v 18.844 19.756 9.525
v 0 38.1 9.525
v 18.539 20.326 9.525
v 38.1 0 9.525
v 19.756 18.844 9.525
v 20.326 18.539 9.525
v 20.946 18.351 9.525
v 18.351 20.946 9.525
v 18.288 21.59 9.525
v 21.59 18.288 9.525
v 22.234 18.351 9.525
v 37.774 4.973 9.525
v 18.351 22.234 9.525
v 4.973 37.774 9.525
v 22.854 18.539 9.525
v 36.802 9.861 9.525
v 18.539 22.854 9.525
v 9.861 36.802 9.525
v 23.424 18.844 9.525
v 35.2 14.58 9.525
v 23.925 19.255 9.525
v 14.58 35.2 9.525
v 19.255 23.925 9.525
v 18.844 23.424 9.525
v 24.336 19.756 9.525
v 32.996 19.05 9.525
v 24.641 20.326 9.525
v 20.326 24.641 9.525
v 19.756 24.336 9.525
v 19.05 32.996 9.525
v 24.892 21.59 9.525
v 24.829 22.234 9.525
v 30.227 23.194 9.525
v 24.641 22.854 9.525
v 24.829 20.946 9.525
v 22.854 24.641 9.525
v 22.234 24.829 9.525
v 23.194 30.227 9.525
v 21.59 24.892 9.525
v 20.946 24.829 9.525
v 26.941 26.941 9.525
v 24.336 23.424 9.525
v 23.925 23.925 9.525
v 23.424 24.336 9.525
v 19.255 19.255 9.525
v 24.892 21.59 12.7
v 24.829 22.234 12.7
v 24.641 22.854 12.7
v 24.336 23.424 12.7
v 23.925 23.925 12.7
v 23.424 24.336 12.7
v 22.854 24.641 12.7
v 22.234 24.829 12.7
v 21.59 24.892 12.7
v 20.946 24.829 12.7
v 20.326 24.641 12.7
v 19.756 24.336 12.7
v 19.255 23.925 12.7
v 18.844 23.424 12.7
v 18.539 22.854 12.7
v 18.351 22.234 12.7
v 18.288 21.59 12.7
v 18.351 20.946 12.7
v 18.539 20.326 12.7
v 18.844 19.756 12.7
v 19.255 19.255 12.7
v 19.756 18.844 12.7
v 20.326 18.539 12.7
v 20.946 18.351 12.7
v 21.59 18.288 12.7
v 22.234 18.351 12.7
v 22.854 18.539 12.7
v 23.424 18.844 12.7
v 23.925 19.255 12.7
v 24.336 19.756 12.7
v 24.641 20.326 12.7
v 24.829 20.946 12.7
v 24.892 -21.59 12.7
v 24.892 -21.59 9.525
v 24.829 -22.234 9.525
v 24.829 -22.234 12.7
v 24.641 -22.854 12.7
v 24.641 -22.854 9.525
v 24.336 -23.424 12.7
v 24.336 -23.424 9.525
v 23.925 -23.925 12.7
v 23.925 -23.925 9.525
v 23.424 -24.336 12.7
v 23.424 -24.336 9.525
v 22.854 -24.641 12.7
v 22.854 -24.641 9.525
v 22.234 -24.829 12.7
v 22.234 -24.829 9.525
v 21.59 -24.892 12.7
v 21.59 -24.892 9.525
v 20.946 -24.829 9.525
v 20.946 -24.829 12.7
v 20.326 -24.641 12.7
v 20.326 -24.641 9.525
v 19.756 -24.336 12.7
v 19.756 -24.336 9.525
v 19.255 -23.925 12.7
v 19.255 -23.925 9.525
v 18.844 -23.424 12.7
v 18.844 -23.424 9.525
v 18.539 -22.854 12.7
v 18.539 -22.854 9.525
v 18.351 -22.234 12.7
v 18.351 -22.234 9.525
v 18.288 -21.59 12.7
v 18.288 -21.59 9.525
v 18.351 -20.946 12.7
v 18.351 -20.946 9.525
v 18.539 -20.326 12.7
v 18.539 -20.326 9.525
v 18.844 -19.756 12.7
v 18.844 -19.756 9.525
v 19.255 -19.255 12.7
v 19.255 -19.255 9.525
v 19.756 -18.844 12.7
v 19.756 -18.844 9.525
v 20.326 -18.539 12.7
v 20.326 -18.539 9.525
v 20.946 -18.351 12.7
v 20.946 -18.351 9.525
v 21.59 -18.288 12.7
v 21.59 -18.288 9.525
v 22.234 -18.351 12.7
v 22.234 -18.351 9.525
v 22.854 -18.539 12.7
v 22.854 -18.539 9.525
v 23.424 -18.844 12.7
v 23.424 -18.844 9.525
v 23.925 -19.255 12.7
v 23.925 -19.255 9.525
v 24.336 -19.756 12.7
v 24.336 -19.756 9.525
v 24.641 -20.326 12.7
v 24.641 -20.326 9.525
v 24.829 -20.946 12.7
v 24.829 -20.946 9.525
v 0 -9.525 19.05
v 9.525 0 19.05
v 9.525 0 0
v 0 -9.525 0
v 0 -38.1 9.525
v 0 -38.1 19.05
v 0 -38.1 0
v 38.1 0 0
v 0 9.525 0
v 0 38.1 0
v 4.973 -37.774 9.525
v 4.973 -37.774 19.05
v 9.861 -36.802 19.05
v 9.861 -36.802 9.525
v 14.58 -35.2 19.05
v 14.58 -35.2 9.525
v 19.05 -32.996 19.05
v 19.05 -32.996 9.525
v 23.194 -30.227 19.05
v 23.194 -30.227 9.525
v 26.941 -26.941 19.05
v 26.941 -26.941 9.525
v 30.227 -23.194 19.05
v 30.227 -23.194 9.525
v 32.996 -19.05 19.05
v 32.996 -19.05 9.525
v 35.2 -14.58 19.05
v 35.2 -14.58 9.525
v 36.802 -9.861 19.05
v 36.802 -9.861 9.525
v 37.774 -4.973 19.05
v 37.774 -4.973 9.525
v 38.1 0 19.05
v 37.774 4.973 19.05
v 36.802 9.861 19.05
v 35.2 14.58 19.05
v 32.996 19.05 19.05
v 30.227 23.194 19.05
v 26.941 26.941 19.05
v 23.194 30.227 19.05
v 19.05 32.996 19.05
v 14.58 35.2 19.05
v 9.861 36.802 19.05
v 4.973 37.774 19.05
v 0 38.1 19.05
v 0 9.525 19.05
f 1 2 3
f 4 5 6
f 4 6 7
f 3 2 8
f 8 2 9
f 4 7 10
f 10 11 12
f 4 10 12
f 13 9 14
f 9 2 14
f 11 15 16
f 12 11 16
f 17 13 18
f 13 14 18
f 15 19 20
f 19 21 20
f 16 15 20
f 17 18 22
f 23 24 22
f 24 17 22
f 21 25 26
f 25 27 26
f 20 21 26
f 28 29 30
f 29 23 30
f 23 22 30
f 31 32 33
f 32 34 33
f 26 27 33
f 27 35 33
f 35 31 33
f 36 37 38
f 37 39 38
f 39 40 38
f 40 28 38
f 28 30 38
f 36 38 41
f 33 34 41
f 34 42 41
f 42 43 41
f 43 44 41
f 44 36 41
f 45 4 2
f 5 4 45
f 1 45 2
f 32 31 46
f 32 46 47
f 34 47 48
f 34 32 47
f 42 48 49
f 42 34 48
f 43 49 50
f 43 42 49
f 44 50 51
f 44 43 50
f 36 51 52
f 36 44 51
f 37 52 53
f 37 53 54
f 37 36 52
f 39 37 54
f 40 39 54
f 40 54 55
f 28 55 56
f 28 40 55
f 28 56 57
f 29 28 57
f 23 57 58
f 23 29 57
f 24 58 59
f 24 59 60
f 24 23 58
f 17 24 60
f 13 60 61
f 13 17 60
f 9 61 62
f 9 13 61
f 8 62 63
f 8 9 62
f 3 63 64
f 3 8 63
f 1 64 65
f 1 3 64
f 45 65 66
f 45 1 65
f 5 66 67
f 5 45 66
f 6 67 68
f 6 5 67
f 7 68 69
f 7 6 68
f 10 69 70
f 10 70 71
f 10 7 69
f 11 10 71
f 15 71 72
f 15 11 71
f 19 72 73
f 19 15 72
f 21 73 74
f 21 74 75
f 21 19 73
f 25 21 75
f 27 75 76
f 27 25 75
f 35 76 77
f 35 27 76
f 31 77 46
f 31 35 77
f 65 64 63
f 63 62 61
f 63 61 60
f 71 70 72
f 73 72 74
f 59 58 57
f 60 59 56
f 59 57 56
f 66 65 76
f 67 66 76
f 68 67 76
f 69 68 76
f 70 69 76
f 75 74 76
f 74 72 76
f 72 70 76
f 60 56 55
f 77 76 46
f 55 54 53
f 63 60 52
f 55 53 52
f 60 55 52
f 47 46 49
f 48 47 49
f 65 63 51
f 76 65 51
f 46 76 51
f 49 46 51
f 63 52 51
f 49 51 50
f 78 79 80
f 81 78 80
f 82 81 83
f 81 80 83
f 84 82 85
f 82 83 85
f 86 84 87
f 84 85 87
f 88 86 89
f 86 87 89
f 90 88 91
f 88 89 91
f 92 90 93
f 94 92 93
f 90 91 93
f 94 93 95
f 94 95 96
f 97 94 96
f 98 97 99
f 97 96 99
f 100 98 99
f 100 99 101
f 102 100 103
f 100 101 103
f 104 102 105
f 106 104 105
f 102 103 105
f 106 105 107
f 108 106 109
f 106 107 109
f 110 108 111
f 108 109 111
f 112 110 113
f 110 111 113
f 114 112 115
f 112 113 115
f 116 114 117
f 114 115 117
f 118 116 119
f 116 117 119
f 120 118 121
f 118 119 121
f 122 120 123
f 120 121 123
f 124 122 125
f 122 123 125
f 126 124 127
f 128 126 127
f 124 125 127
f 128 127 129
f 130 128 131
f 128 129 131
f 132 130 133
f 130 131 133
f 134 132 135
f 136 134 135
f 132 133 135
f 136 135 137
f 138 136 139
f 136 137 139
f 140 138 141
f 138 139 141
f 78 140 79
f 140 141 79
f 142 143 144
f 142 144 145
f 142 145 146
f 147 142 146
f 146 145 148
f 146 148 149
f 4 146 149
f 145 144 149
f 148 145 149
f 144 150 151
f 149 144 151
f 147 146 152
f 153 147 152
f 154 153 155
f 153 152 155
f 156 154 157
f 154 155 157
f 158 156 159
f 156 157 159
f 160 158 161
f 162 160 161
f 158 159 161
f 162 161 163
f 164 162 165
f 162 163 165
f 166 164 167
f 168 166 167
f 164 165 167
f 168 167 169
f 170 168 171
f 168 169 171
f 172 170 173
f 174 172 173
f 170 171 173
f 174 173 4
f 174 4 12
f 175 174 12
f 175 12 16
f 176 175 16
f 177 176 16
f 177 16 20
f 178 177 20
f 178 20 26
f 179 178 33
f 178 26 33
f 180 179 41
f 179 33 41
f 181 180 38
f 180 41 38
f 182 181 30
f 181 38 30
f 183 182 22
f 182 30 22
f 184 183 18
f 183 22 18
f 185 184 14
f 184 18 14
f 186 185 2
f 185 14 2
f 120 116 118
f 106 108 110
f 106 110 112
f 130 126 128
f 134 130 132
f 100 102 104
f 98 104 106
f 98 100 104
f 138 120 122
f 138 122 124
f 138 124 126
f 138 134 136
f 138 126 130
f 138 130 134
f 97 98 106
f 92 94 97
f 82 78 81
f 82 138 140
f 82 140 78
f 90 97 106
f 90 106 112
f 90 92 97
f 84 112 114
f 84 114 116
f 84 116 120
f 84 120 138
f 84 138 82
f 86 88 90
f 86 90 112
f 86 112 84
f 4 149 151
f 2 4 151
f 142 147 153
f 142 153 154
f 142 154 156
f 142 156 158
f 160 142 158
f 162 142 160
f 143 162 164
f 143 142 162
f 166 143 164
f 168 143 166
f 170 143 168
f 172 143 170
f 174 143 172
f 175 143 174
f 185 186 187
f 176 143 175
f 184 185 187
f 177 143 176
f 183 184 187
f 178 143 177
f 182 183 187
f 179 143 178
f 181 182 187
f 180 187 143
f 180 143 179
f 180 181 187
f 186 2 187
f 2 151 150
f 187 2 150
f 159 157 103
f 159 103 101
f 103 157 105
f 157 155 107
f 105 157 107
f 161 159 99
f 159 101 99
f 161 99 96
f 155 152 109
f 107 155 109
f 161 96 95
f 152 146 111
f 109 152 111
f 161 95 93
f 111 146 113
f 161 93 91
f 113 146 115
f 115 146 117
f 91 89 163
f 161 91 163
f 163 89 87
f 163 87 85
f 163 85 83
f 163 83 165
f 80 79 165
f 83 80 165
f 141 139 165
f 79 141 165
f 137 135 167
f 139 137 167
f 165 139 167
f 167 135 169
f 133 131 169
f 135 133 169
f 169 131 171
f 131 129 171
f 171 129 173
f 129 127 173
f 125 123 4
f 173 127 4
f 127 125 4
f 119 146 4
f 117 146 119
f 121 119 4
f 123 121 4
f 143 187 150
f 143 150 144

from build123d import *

# Parameters (mm, degrees)
F1_DEPTH = 9.525
F3_DEPTH = 9.525
F5_DEPTH = 25.4
F6_R     = 3.302
F7_DEPTH = 3.175


# Not quite as in the source:
# - a pattern or mirror of a feature is missing from the dataset's text; its kind, count and spacing are read off the source's solid


with BuildPart() as f1:
    # F0 (on Top) → F1 (new body)
    with BuildSketch(Plane.XY):
        Polygon((38.1, 0), (0, 38.1), (0, -38.1), align=None)
    extrude(amount=F1_DEPTH)

    # F2 (on face) → F3 (join)
    with BuildSketch(Plane.XY.offset(9.525)):
        with BuildLine():
            ThreePointArc((0, -38.1), (38.1, 0), (0, 38.1))
            Line((0, 38.1), (0, -38.1))
        make_face()
    extrude(amount=F3_DEPTH)

    # F4 (on face) → F5 (cut)
    with BuildSketch(Plane(origin=(0, 0, 0), x_dir=(1, 0, 0), z_dir=(0, 0, -1))):
        Polygon((9.525, 0), (0, 9.525), (0, -9.525), align=None)
    extrude(amount=-F5_DEPTH, mode=Mode.SUBTRACT)

    # F6 (on face) → F7 (cut)
    with BuildSketch(Plane(origin=(0, 0, 9.525), x_dir=(1, 0, 0), z_dir=(0, 0, -1))):
        with Locations((21.59, 21.59)):
            Circle(F6_R)
    f7 = extrude(amount=-F7_DEPTH, mode=Mode.SUBTRACT)

    # F7_copies: F7 across plane
    add(f7.mirror(Plane.ZX), mode=Mode.SUBTRACT)


solid = f1.part
